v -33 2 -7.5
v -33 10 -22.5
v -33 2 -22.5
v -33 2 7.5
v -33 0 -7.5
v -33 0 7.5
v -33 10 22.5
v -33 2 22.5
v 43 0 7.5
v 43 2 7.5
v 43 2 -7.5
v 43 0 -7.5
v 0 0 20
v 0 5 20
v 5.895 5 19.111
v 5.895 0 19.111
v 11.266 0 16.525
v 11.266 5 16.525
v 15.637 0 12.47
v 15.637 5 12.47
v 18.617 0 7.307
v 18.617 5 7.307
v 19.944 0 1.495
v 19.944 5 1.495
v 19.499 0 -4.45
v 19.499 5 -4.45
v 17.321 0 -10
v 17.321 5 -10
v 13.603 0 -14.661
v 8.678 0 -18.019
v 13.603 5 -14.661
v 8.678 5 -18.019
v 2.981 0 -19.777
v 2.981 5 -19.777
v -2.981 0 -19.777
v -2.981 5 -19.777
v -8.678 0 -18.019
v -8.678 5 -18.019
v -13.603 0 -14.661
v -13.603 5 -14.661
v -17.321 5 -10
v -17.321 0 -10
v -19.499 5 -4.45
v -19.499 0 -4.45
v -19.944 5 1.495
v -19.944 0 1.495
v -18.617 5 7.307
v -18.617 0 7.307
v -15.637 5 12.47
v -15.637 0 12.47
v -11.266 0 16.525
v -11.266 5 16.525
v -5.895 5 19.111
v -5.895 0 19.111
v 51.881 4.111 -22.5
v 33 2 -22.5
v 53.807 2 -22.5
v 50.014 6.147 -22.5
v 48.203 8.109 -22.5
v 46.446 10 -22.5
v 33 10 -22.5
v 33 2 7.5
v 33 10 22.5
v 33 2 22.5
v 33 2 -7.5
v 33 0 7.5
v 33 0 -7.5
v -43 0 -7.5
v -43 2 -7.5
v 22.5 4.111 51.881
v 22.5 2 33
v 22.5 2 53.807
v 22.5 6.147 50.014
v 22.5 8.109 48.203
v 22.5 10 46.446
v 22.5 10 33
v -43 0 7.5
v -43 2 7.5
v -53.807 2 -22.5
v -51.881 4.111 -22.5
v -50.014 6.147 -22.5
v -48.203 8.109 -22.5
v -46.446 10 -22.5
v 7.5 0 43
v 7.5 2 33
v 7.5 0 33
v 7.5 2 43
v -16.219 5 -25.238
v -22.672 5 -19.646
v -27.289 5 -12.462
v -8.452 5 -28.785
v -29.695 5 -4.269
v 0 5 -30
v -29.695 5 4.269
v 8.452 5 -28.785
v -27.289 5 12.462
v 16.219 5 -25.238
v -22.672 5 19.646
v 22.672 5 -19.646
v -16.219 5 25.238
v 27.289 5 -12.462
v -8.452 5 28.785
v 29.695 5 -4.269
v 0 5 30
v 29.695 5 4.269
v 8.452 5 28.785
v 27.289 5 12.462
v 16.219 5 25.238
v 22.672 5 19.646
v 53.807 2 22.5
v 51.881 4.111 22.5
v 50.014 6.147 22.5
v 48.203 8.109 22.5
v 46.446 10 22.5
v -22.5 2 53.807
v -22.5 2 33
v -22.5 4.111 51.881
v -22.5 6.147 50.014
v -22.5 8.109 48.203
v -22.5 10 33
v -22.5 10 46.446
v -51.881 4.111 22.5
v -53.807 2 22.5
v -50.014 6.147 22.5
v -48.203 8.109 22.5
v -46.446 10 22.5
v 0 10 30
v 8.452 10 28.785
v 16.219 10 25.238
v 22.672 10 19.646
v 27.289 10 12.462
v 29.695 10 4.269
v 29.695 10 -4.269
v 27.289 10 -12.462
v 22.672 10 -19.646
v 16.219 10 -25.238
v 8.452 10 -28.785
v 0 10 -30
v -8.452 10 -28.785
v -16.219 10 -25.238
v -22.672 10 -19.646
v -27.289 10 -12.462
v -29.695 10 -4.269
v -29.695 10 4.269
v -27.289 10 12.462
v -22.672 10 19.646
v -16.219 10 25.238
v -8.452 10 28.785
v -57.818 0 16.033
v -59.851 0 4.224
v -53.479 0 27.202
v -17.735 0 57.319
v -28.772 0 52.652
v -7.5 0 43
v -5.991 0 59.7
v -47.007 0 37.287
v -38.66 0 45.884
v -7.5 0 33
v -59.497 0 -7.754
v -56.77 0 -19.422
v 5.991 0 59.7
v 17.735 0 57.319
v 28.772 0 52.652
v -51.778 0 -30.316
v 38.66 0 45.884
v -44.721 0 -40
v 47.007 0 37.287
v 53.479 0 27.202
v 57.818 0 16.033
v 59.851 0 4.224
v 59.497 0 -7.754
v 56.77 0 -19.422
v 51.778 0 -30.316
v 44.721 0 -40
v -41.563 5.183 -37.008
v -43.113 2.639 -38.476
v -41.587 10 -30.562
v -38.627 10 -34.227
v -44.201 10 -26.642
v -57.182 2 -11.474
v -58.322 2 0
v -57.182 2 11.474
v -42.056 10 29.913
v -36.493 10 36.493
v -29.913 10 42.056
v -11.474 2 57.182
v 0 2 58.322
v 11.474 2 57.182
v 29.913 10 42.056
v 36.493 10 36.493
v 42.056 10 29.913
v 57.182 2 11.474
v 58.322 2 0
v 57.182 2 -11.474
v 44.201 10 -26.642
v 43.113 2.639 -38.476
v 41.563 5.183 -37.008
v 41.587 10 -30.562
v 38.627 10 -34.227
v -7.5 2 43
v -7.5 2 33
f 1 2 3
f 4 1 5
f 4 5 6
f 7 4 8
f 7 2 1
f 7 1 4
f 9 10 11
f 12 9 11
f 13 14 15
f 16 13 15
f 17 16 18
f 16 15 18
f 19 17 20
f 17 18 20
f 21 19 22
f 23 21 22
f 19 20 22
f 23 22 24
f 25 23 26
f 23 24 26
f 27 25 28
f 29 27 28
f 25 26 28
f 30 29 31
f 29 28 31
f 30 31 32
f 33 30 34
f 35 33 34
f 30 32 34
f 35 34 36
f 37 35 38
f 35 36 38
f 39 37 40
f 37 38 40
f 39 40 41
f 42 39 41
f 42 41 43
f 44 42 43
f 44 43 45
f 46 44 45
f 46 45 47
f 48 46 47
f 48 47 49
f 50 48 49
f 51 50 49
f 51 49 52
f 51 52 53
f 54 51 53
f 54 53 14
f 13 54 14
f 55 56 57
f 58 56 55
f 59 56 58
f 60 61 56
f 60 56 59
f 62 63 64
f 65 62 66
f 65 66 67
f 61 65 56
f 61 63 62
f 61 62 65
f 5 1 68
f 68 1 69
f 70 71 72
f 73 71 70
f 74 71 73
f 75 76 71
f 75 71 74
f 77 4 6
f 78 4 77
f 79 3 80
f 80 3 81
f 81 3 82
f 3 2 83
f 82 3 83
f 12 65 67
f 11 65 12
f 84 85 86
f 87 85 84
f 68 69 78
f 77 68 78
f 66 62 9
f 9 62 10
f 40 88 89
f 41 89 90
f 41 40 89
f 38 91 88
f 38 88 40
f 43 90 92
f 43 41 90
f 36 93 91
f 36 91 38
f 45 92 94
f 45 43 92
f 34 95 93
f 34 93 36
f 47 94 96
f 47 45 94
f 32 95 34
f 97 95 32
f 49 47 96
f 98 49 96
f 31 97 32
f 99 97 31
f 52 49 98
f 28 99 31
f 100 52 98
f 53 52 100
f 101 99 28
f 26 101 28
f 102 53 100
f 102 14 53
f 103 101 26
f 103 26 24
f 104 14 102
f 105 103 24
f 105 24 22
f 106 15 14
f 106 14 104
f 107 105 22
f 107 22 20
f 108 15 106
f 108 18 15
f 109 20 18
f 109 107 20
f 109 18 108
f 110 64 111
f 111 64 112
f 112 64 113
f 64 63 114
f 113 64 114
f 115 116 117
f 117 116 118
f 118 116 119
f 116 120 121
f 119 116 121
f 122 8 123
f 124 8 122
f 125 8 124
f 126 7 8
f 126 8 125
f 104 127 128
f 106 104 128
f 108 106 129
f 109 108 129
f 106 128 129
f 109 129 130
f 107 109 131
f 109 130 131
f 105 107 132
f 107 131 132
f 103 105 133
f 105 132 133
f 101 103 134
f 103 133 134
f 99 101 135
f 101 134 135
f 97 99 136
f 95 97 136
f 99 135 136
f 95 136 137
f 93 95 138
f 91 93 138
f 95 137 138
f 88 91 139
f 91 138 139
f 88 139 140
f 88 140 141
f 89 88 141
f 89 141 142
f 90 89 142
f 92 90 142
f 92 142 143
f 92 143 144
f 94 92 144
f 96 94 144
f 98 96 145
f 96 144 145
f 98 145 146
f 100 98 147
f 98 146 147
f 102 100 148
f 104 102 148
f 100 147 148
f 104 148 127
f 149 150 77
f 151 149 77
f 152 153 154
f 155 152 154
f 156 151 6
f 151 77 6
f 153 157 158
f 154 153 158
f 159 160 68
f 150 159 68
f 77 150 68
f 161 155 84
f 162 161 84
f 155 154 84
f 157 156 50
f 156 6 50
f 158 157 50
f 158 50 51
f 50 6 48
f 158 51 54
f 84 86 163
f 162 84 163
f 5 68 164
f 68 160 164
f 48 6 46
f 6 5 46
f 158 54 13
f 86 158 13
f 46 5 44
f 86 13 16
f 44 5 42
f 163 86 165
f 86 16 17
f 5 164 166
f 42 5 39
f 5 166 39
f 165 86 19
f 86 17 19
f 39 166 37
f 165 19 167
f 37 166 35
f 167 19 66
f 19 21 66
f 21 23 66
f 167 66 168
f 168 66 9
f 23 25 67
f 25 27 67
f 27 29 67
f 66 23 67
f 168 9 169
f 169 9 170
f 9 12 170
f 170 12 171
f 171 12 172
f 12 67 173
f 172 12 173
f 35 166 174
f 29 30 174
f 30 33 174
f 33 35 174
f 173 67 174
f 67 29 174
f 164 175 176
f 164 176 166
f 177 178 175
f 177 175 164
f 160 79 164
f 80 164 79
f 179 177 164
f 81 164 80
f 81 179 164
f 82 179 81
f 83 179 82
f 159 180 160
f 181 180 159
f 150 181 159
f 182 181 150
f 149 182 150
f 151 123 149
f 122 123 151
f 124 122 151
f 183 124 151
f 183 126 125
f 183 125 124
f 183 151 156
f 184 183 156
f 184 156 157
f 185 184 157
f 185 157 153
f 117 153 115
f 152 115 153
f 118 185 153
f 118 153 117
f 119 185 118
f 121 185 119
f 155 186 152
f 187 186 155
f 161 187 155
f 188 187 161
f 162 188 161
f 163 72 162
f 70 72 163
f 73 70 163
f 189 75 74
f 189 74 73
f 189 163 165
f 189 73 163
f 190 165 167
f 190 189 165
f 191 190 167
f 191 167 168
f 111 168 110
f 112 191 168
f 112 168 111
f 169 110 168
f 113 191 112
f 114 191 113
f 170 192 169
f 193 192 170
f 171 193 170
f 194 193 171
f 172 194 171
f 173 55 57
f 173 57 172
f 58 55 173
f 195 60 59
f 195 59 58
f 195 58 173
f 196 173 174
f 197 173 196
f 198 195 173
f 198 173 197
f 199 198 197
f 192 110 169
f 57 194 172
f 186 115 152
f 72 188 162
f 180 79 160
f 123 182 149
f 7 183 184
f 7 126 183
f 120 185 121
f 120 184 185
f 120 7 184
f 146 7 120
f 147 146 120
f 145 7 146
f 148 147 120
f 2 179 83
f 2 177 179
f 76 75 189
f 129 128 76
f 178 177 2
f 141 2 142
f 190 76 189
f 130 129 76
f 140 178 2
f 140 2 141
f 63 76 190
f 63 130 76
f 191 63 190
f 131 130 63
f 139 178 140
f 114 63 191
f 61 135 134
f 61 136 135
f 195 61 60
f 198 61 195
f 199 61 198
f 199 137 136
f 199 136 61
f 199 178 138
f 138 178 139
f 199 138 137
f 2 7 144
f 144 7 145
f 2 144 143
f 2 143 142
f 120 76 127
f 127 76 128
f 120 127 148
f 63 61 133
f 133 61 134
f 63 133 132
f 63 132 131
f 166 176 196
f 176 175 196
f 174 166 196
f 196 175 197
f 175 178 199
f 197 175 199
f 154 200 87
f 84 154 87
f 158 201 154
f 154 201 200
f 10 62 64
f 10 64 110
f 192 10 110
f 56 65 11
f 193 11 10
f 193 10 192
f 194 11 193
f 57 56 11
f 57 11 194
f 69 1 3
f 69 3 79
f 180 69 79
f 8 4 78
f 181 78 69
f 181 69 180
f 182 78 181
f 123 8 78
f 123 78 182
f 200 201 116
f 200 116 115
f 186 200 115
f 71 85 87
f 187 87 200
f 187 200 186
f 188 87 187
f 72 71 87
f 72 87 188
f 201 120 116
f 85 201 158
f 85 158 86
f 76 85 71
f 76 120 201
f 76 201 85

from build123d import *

# Parameters (mm, degrees)
SKETCH1_R           = 60
BOSS_EXTRUDE1_DEPTH = 10
BOSS_EXTRUDE1_TAPER = 40
SKETCH2_W           = 102.123847816
SKETCH2_H           = 48.488569787
CUT_EXTRUDE1_DEPTH  = 86.440037605
CHAMFER1_SIZE2      = 5.773502692
CHAMFER1_SIZE       = 10
SKETCH3_R           = 20
CUT_EXTRUDE2_DEPTH  = 86.440037453
SKETCH4_W           = 35.035611717
SKETCH4_H           = 45
CUT_EXTRUDE3_DEPTH  = 8
SKETCH6_W           = 10
SKETCH6_H           = 15
CUT_EXTRUDE5_DEPTH  = 86.229103011
CIRPATTERN1_COUNT   = 3
CIRPATTERN1_ANGLE   = 180
SKETCH7_R           = 30
CUT_EXTRUDE6_DEPTH  = 5


with BuildPart() as part:
    # Sketch1 → Boss-Extrude1 (new body)
    with BuildSketch(Plane(origin=(0, 0, 0), x_dir=(1, 0, 0), z_dir=(0, 1, 0))):
        Circle(SKETCH1_R)
    extrude(amount=BOSS_EXTRUDE1_DEPTH, taper=BOSS_EXTRUDE1_TAPER)

    # Sketch2 → Cut-Extrude1 (cut, through all)
    with BuildSketch(Plane(origin=(0, 10, 0), x_dir=(1, 0, 0), z_dir=(0, 1, 0))):
        with Locations((-1.760755997, 64.244284894)):
            Rectangle(SKETCH2_W, SKETCH2_H)
    extrude(amount=-CUT_EXTRUDE1_DEPTH, mode=Mode.SUBTRACT)

    # Chamfer1
    chamfer1_edges = [part.edges().sort_by_distance(p)[0] for p in [
        (0, 10, -40),
    ]]
    chamfer1_side = [part.faces().sort_by_distance(p)[0] for p in [
        (0, 9.884529946, -40),
    ]]
    chamfer(chamfer1_edges, length=CHAMFER1_SIZE - 0.0001, length2=CHAMFER1_SIZE2 - 0.0001, reference=chamfer1_side[0])  # a hair under: the kernel refuses the full size

    # Sketch3 → Cut-Extrude2 (cut, through all)
    with BuildSketch(Plane(origin=(0, 10, 0), x_dir=(1, 0, 0), z_dir=(0, 1, 0))):
        with Locations(Location((0, 0, 0), (0, 0, 270))):
            Circle(SKETCH3_R)
    extrude(amount=-CUT_EXTRUDE2_DEPTH, mode=Mode.SUBTRACT)

    # Sketch4 → Cut-Extrude3 (cut)
    with BuildSketch(Plane(origin=(0, 10, 0), x_dir=(1, 0, 0), z_dir=(0, 1, 0))):
        with Locations((50.517805859, 0)):
            Rectangle(SKETCH4_W, SKETCH4_H)
    cut_extrude3 = extrude(amount=-CUT_EXTRUDE3_DEPTH, mode=Mode.SUBTRACT)

    # Sketch6 → Cut-Extrude5 (cut, through all)
    with BuildSketch(Plane(origin=(0, 2, 0), x_dir=(1, 0, 0), z_dir=(0, 1, 0))):
        with Locations((38, 0)):
            Rectangle(SKETCH6_W, SKETCH6_H)
    cut_extrude5 = extrude(amount=-CUT_EXTRUDE5_DEPTH, mode=Mode.SUBTRACT)

    # CirPattern1: Cut-Extrude3, Cut-Extrude5 ×3 about axis
    cirpattern1_axis = Axis((0, 0, 0), (0, -1, 0))
    add([cut_extrude3.rotate(cirpattern1_axis, i * CIRPATTERN1_ANGLE / (CIRPATTERN1_COUNT - 1)) for i in range(1, CIRPATTERN1_COUNT)], mode=Mode.SUBTRACT)
    add([cut_extrude5.rotate(cirpattern1_axis, i * CIRPATTERN1_ANGLE / (CIRPATTERN1_COUNT - 1)) for i in range(1, CIRPATTERN1_COUNT)], mode=Mode.SUBTRACT)

    # Sketch7 → Cut-Extrude6 (cut)
    with BuildSketch(Plane(origin=(0, 10, 0), x_dir=(1, 0, 0), z_dir=(0, 1, 0))):
        with Locations(Location((0, 0, 0), (0, 0, 270))):
            Circle(SKETCH7_R)
    extrude(amount=-CUT_EXTRUDE6_DEPTH, mode=Mode.SUBTRACT)


solid = part.part
